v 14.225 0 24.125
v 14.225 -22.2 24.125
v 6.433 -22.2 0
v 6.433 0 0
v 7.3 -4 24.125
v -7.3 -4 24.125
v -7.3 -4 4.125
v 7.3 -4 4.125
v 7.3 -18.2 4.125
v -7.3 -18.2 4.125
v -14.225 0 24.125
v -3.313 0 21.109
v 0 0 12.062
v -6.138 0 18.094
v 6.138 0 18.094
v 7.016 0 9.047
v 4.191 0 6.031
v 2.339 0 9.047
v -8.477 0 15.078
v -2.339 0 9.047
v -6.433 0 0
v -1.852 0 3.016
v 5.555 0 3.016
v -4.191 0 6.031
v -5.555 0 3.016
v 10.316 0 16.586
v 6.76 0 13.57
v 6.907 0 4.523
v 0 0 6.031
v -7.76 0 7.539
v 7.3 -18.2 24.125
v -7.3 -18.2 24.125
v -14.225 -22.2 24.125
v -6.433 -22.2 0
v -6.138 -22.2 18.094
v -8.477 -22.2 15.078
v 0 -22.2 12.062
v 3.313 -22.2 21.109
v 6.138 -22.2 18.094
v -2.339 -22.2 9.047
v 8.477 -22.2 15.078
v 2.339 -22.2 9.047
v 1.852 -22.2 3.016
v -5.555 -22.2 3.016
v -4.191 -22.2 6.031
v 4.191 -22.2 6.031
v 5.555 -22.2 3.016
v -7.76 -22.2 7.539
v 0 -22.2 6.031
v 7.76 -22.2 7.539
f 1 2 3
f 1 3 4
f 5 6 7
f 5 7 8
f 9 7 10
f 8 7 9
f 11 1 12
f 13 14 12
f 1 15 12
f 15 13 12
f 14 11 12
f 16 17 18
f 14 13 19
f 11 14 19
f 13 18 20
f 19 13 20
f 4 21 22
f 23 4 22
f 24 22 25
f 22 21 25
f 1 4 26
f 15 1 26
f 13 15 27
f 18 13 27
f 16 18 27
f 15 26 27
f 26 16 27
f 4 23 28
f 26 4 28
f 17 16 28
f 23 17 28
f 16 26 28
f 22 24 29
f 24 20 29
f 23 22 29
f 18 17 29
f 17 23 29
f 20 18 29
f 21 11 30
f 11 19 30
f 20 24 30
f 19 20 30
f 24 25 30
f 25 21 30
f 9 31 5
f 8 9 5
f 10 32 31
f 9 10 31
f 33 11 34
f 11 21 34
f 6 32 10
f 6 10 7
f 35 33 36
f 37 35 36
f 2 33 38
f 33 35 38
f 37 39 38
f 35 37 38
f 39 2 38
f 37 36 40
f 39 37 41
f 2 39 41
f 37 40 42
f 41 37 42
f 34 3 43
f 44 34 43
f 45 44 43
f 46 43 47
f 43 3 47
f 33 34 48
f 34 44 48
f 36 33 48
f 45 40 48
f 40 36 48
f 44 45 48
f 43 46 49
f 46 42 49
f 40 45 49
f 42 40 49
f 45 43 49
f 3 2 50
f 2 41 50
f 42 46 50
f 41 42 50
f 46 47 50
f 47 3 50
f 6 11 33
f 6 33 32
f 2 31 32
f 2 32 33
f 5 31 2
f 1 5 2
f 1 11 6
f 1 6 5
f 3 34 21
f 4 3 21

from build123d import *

# Parameters (mm, degrees)
F1_W      = 36.2
F1_H      = 22.2
F2_W      = 12.866667
F2_H      = 22.2
F3_FACE_W = 36.2
F3_FACE_H = 22.2
F4_DEPTH  = 12
F5_W      = 14.6
F5_H      = 14.2
F6_DEPTH  = 32


with BuildPart() as f3:
    # F1 (on offset) → F3 section 0
    with BuildSketch(Plane.XY.offset(36.125)):
        with Locations((0, -11.1)):
            Rectangle(F1_W, F1_H)
    # F2 (on Top) → F3 section 1
    with BuildSketch(Plane.XY):
        with Locations((-3.3e-05, -11.1)):
            Rectangle(F2_W, F2_H)
    loft()

    # F3_face (on face) → F4 (cut)
    with BuildSketch(Plane(origin=(0, -11.1, 36.125), x_dir=(1, 0, 0), z_dir=(0, 0, 1))):
        Rectangle(F3_FACE_W, F3_FACE_H)
    extrude(amount=-F4_DEPTH, mode=Mode.SUBTRACT)

    # F5 (on offset) → F6 (cut)
    with BuildSketch(Plane.XY.offset(36.125)):
        with Locations((0, -11.1)):
            Rectangle(F5_W, F5_H)
    extrude(amount=-F6_DEPTH, mode=Mode.SUBTRACT)


solid = f3.part
